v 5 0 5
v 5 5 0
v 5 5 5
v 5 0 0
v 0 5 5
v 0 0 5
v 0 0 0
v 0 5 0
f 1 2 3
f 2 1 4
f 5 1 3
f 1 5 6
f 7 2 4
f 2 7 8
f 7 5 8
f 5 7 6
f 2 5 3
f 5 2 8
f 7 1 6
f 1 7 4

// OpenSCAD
/********************************************************************
 * TinkerLib : Test code
 * https://github.com/tinkerology/tinkerlib
 * By Scott P Leslie (https://twitter.com/tinkerology)
 * Licensed Under Creative Commons Attributions Share Alike 
 * (http://creativecommons.org/licenses/by-sa/3.0/deed.en_US)
 *******************************************************************/

FRAGMENTS=40;

module drawCylinder(depth, radius)
{
//	translate([-1*depth,-1*depth,-1*depth])
	% cylinder(depth, radius, radius/2, $fn=FRAGMENTS);
//	linear_extrude(height = depth, center = true, convexity = 10, twist = 0)
//	circle(radius, $fn=FRAGMENTS);
}


module cubeWithHoles(x,y,z)
{
	difference()
	{
		cube([x,y,z]);

		translate([x/2,y/2,z/2])
		% drawCylinder( y * 2, x * 0.4 );

		rotate([0,90,0]) 
		translate([-1 * x/2,1 * y/2,z/2])
		% drawCylinder( y * 2, x * 0.4 );
	}
}

module bug()
{
	difference()
	{
		cube([5,5,5]);

		translate([-1,-1,-1])
		% cube([2,2,8]);
	}

//		% cylinder(5, 3, 3, $fn=20);
}

bug();


//cubeWithHoles(5,5,5);
